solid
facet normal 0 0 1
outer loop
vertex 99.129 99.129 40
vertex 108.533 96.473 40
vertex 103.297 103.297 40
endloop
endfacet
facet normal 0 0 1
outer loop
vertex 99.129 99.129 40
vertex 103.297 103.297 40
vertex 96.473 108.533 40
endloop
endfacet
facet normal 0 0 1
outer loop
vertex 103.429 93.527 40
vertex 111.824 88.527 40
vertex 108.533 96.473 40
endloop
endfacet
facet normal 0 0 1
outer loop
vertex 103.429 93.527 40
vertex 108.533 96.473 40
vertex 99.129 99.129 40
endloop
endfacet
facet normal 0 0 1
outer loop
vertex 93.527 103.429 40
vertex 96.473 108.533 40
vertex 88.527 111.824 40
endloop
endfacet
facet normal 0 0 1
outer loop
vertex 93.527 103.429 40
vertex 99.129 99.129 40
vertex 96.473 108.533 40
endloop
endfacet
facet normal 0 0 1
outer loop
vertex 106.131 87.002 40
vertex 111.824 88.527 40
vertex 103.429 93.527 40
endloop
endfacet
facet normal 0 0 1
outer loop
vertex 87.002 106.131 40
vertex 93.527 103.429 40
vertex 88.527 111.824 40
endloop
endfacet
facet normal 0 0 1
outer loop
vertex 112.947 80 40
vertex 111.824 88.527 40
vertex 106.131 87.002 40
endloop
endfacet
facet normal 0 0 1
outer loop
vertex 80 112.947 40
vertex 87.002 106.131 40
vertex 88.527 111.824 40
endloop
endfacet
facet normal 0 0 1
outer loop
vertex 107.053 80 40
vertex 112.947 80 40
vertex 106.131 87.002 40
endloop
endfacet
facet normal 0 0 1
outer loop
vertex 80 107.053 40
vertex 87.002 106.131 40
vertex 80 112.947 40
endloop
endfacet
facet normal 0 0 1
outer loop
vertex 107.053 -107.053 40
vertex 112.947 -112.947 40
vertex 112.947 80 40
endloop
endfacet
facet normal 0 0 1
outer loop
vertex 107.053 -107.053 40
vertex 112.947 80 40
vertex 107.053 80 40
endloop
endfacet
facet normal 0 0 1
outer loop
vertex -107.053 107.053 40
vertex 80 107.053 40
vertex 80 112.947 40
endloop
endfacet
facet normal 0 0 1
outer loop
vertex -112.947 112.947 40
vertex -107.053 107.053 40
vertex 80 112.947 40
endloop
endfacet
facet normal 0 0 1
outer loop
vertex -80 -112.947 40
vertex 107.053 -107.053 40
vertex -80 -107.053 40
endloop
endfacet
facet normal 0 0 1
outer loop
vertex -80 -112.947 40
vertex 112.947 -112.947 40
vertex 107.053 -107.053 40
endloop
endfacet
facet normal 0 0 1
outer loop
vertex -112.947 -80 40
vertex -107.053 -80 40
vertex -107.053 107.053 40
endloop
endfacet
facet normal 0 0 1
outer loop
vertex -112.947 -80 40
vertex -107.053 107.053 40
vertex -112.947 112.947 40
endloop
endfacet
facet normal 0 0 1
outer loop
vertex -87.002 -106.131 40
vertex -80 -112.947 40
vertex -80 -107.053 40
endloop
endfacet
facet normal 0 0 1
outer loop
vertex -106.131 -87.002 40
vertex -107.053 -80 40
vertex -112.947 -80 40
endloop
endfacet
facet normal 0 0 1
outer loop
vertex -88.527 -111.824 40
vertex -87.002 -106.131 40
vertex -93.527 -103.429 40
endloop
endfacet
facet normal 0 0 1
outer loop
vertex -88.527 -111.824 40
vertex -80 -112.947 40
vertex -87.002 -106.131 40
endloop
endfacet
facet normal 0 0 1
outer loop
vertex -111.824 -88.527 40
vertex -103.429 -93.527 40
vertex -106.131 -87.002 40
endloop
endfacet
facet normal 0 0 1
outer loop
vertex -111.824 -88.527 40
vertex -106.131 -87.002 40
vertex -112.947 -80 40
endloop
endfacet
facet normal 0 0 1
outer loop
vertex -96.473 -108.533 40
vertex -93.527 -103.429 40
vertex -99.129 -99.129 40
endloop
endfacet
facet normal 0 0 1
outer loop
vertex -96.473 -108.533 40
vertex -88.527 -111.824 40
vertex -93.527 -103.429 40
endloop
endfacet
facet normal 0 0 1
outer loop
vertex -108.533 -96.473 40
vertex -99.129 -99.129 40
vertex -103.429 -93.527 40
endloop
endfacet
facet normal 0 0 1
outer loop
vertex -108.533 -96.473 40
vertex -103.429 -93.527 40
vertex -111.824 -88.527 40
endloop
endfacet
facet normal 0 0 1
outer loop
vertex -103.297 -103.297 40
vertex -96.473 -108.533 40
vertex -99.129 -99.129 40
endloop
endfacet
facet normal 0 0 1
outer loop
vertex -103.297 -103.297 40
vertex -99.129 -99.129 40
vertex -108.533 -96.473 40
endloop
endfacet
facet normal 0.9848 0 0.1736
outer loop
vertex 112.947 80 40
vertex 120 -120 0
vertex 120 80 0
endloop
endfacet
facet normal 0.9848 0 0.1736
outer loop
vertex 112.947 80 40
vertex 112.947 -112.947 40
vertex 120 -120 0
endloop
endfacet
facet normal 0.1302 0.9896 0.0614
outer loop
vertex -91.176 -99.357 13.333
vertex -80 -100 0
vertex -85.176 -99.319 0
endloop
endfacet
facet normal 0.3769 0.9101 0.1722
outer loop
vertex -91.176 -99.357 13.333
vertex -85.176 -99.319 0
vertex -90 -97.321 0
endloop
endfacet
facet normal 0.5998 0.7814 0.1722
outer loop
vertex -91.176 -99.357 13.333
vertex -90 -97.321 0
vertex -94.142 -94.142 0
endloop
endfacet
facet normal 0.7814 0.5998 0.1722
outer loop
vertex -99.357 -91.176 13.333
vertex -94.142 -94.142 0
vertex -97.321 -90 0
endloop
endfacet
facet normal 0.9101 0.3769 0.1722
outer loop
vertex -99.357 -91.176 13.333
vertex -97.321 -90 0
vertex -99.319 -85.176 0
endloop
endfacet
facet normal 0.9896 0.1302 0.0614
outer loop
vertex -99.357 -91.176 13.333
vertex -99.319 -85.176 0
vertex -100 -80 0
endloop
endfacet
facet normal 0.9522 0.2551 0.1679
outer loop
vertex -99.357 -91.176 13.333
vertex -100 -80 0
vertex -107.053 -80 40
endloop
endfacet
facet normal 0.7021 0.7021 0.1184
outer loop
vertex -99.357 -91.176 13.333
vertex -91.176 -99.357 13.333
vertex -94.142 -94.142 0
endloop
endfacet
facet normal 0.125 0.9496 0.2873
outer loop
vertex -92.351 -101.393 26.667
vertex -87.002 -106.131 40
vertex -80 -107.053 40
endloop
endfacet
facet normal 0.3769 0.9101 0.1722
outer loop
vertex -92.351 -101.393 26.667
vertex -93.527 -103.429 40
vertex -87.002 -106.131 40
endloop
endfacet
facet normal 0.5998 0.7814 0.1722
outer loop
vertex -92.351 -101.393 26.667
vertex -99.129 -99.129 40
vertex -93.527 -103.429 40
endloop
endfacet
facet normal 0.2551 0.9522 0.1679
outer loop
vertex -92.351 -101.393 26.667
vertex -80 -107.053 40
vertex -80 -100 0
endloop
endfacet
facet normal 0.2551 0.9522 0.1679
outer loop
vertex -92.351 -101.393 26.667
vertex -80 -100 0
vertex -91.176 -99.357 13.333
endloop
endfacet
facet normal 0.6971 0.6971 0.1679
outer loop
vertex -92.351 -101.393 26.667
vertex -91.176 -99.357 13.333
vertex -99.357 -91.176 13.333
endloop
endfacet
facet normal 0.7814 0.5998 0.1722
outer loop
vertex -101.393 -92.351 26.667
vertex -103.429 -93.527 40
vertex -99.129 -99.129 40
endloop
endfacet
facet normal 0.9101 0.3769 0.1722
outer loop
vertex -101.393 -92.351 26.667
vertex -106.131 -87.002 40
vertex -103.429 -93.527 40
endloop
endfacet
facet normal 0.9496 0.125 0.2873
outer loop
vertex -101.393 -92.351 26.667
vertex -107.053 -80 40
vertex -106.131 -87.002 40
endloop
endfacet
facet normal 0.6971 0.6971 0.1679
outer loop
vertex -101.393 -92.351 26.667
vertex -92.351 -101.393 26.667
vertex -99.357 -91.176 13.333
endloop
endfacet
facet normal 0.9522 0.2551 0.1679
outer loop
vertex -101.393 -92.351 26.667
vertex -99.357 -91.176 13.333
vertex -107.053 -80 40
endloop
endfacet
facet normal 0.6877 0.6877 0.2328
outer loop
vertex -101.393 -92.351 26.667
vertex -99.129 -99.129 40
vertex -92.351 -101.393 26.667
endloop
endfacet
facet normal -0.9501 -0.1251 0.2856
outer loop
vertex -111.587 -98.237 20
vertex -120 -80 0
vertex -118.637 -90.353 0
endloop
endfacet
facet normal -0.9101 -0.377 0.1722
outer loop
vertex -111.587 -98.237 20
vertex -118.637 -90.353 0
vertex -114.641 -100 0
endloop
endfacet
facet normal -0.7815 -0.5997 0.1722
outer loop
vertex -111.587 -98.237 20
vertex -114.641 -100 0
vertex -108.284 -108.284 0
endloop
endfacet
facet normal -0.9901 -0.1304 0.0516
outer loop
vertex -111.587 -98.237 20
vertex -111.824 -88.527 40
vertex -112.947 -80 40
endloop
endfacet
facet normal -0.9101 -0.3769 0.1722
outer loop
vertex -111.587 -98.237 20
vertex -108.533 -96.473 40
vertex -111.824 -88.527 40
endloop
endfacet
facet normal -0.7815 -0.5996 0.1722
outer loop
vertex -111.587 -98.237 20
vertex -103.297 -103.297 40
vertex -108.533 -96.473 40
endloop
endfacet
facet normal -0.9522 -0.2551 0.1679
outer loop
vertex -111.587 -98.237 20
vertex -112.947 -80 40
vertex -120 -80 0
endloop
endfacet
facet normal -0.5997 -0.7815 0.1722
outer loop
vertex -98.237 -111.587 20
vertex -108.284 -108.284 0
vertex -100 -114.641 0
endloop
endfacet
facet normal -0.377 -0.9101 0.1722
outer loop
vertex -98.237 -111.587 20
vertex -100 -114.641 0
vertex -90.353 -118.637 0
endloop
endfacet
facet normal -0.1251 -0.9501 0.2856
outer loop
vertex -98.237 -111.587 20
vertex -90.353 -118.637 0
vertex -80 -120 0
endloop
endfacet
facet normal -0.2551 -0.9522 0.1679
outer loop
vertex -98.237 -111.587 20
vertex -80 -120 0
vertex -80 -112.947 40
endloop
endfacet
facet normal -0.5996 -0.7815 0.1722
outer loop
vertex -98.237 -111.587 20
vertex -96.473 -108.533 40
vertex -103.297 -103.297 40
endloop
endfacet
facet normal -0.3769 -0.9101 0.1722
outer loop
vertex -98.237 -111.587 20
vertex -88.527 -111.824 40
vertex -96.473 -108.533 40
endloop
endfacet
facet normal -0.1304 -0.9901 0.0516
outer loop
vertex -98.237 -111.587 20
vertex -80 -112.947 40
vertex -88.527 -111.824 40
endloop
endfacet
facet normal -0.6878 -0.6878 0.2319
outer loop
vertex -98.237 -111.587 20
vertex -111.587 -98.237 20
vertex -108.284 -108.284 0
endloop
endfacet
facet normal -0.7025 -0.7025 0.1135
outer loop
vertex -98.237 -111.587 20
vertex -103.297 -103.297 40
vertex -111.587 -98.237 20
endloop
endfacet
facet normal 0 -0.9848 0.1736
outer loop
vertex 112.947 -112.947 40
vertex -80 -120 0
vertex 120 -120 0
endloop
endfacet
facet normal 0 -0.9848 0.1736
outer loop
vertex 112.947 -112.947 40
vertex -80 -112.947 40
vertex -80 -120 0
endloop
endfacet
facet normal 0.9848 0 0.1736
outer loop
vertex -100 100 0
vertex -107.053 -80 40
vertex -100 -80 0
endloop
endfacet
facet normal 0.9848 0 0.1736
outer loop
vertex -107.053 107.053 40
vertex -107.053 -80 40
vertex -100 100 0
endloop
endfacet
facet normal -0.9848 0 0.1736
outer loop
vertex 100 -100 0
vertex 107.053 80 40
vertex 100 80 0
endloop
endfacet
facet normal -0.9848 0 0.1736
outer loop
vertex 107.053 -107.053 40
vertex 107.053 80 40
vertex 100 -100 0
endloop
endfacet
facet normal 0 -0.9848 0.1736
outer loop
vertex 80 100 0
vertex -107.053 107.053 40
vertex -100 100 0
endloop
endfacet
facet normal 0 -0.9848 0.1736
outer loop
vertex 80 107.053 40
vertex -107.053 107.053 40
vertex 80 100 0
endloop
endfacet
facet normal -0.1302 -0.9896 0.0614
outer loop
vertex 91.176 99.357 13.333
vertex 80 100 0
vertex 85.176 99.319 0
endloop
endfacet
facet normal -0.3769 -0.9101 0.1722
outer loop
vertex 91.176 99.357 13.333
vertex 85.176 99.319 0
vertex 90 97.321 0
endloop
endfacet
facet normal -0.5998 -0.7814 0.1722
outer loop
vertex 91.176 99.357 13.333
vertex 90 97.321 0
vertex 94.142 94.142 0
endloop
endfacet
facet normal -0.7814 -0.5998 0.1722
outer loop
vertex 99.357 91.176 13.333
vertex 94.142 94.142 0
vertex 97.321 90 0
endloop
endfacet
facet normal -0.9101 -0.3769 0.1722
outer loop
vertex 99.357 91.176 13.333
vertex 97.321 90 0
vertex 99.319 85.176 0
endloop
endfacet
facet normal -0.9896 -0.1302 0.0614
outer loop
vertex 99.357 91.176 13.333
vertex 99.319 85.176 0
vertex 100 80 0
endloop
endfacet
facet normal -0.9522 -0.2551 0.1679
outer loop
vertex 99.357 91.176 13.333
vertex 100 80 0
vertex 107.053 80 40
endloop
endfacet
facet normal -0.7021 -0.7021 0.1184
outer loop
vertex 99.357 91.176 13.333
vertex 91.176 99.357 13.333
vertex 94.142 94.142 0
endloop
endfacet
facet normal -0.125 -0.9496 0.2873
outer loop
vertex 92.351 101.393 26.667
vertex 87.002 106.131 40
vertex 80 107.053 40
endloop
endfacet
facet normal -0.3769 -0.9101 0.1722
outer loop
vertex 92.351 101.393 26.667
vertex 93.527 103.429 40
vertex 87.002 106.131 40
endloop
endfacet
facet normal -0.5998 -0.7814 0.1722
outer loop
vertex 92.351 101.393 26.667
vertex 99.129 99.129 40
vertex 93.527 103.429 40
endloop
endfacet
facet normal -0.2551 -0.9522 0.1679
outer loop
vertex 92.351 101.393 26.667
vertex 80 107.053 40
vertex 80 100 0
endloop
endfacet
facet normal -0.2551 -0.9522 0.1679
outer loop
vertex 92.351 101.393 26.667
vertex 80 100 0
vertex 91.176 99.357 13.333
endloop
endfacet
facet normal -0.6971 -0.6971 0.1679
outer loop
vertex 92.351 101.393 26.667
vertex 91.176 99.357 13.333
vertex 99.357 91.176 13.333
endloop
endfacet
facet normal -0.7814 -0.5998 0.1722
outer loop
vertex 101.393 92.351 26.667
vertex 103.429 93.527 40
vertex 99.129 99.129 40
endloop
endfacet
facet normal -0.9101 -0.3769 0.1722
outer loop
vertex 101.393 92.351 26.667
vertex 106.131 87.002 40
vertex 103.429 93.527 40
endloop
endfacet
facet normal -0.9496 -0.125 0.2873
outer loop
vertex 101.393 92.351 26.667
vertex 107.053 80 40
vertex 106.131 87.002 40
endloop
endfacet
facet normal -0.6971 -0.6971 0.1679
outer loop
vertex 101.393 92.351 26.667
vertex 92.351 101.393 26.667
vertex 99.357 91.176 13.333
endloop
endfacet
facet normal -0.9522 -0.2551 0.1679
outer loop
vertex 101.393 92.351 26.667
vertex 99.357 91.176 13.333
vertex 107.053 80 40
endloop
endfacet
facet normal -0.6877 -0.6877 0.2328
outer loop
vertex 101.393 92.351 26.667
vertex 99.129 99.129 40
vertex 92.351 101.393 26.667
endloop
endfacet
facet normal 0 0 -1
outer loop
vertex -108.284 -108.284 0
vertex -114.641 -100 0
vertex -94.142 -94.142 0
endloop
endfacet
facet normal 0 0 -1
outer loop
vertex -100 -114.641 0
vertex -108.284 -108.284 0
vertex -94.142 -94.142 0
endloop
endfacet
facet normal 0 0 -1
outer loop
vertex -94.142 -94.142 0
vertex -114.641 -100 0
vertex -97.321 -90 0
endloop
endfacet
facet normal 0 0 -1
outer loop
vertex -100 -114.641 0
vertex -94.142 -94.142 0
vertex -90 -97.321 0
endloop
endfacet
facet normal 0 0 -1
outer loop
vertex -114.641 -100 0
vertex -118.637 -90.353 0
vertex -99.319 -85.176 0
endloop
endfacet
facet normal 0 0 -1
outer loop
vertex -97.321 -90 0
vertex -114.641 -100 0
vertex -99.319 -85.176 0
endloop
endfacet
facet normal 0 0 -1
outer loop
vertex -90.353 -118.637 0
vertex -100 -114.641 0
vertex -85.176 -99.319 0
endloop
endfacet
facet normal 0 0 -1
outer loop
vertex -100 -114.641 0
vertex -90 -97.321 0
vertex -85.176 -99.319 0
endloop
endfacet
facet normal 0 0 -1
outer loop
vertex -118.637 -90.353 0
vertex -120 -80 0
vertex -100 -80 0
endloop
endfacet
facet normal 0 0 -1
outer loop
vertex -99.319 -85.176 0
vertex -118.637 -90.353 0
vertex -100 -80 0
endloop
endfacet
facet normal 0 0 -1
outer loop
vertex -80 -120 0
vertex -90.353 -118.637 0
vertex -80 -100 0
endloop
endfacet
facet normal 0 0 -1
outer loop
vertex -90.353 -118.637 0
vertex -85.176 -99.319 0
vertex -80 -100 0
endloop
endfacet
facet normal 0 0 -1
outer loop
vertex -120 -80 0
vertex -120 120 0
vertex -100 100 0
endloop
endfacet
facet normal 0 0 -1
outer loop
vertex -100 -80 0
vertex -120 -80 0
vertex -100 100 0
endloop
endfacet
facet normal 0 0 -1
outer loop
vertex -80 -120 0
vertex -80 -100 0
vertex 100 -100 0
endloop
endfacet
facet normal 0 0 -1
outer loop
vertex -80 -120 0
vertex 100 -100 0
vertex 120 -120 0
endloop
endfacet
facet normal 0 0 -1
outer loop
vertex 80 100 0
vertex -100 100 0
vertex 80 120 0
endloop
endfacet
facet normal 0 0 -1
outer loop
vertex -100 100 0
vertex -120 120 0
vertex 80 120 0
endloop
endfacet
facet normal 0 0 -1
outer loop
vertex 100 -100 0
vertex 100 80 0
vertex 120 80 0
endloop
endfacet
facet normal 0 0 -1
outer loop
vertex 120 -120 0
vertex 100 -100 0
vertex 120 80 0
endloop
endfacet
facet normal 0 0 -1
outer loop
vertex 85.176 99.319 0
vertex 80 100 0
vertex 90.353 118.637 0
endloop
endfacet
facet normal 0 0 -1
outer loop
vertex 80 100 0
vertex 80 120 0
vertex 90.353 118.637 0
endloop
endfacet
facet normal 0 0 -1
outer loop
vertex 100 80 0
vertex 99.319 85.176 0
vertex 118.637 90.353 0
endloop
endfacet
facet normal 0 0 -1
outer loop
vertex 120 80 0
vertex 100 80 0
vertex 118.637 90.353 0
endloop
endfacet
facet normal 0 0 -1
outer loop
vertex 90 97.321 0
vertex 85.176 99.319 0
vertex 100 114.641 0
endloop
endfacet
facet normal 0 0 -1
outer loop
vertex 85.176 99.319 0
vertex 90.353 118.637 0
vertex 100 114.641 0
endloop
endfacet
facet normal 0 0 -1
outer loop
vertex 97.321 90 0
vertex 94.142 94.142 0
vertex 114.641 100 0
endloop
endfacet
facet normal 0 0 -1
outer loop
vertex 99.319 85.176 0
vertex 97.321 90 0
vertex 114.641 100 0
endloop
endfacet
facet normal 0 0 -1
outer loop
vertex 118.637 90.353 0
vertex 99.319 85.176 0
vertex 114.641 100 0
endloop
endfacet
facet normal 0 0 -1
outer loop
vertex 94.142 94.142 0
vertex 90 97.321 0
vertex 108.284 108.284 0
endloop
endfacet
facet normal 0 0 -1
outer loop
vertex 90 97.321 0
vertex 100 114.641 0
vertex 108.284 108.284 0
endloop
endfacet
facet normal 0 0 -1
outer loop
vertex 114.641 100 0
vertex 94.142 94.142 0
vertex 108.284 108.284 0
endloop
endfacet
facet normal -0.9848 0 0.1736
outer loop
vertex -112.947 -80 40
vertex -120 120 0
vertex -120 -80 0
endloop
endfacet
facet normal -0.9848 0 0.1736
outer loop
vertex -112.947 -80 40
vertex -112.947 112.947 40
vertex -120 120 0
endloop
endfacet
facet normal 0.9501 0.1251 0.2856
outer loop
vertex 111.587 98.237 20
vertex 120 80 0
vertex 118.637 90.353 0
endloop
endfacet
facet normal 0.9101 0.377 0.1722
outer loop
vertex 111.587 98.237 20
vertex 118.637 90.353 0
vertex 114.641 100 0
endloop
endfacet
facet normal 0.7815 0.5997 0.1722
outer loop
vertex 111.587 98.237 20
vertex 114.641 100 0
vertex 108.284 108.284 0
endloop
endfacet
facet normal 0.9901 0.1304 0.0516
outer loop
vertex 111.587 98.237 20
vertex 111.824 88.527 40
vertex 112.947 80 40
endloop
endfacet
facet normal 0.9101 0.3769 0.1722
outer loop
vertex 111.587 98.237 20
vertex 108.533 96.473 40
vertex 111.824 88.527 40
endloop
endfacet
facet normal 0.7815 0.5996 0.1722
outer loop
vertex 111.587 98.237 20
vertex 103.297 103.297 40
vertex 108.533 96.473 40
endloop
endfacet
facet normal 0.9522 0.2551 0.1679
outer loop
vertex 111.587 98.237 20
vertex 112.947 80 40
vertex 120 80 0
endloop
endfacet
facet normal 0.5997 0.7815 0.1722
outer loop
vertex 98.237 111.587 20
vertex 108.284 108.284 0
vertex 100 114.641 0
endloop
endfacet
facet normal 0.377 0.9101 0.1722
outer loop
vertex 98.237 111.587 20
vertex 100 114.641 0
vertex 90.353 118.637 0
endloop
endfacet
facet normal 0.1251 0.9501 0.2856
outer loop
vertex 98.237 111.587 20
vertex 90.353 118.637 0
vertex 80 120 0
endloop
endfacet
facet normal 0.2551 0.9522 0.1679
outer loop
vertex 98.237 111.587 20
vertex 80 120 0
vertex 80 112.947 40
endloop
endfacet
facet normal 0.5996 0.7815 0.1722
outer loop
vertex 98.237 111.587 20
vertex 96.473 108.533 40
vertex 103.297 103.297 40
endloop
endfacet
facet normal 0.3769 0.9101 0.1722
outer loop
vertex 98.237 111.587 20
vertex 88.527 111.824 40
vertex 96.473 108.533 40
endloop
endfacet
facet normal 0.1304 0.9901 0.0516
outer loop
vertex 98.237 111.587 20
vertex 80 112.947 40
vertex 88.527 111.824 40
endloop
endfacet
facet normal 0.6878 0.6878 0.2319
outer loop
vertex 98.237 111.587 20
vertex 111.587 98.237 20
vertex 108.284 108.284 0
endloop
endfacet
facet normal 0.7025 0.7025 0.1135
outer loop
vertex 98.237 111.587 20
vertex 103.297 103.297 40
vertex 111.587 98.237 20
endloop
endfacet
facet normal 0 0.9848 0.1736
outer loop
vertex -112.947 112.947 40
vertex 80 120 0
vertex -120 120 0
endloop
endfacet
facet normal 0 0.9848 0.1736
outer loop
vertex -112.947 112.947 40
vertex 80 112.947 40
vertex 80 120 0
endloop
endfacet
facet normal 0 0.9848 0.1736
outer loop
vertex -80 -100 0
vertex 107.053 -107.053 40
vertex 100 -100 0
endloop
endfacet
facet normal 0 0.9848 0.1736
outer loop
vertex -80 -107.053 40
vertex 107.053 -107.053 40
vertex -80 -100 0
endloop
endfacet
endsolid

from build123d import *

# Parameters (mm, degrees)
F1_DEPTH = 40
F1_TAPER = 10


with BuildPart() as f1:
    # F0 (on Top) → F1 (new body)
    with BuildSketch(Plane.XY):
        with BuildLine():
            Line((80, 120), (-120, 120))
            Line((-120, 120), (-120, -80))
            ThreePointArc((-120, -80), (-108.2842712475, -108.2842712475), (-80, -120))
            Line((-80, -120), (120, -120))
            Line((120, -120), (120, 80))
            ThreePointArc((120, 80), (108.2842712475, 108.2842712475), (80, 120))
        make_face()
        with BuildLine():
            Line((-100, 100), (80, 100))
            ThreePointArc((80, 100), (94.1421356237, 94.1421356237), (100, 80))
            Line((100, 80), (100, -100))
            Line((100, -100), (-80, -100))
            ThreePointArc((-80, -100), (-94.1421356237, -94.1421356237), (-100, -80))
            Line((-100, -80), (-100, 100))
        make_face(mode=Mode.SUBTRACT)
    extrude(amount=F1_DEPTH, taper=F1_TAPER)


solid = f1.part
